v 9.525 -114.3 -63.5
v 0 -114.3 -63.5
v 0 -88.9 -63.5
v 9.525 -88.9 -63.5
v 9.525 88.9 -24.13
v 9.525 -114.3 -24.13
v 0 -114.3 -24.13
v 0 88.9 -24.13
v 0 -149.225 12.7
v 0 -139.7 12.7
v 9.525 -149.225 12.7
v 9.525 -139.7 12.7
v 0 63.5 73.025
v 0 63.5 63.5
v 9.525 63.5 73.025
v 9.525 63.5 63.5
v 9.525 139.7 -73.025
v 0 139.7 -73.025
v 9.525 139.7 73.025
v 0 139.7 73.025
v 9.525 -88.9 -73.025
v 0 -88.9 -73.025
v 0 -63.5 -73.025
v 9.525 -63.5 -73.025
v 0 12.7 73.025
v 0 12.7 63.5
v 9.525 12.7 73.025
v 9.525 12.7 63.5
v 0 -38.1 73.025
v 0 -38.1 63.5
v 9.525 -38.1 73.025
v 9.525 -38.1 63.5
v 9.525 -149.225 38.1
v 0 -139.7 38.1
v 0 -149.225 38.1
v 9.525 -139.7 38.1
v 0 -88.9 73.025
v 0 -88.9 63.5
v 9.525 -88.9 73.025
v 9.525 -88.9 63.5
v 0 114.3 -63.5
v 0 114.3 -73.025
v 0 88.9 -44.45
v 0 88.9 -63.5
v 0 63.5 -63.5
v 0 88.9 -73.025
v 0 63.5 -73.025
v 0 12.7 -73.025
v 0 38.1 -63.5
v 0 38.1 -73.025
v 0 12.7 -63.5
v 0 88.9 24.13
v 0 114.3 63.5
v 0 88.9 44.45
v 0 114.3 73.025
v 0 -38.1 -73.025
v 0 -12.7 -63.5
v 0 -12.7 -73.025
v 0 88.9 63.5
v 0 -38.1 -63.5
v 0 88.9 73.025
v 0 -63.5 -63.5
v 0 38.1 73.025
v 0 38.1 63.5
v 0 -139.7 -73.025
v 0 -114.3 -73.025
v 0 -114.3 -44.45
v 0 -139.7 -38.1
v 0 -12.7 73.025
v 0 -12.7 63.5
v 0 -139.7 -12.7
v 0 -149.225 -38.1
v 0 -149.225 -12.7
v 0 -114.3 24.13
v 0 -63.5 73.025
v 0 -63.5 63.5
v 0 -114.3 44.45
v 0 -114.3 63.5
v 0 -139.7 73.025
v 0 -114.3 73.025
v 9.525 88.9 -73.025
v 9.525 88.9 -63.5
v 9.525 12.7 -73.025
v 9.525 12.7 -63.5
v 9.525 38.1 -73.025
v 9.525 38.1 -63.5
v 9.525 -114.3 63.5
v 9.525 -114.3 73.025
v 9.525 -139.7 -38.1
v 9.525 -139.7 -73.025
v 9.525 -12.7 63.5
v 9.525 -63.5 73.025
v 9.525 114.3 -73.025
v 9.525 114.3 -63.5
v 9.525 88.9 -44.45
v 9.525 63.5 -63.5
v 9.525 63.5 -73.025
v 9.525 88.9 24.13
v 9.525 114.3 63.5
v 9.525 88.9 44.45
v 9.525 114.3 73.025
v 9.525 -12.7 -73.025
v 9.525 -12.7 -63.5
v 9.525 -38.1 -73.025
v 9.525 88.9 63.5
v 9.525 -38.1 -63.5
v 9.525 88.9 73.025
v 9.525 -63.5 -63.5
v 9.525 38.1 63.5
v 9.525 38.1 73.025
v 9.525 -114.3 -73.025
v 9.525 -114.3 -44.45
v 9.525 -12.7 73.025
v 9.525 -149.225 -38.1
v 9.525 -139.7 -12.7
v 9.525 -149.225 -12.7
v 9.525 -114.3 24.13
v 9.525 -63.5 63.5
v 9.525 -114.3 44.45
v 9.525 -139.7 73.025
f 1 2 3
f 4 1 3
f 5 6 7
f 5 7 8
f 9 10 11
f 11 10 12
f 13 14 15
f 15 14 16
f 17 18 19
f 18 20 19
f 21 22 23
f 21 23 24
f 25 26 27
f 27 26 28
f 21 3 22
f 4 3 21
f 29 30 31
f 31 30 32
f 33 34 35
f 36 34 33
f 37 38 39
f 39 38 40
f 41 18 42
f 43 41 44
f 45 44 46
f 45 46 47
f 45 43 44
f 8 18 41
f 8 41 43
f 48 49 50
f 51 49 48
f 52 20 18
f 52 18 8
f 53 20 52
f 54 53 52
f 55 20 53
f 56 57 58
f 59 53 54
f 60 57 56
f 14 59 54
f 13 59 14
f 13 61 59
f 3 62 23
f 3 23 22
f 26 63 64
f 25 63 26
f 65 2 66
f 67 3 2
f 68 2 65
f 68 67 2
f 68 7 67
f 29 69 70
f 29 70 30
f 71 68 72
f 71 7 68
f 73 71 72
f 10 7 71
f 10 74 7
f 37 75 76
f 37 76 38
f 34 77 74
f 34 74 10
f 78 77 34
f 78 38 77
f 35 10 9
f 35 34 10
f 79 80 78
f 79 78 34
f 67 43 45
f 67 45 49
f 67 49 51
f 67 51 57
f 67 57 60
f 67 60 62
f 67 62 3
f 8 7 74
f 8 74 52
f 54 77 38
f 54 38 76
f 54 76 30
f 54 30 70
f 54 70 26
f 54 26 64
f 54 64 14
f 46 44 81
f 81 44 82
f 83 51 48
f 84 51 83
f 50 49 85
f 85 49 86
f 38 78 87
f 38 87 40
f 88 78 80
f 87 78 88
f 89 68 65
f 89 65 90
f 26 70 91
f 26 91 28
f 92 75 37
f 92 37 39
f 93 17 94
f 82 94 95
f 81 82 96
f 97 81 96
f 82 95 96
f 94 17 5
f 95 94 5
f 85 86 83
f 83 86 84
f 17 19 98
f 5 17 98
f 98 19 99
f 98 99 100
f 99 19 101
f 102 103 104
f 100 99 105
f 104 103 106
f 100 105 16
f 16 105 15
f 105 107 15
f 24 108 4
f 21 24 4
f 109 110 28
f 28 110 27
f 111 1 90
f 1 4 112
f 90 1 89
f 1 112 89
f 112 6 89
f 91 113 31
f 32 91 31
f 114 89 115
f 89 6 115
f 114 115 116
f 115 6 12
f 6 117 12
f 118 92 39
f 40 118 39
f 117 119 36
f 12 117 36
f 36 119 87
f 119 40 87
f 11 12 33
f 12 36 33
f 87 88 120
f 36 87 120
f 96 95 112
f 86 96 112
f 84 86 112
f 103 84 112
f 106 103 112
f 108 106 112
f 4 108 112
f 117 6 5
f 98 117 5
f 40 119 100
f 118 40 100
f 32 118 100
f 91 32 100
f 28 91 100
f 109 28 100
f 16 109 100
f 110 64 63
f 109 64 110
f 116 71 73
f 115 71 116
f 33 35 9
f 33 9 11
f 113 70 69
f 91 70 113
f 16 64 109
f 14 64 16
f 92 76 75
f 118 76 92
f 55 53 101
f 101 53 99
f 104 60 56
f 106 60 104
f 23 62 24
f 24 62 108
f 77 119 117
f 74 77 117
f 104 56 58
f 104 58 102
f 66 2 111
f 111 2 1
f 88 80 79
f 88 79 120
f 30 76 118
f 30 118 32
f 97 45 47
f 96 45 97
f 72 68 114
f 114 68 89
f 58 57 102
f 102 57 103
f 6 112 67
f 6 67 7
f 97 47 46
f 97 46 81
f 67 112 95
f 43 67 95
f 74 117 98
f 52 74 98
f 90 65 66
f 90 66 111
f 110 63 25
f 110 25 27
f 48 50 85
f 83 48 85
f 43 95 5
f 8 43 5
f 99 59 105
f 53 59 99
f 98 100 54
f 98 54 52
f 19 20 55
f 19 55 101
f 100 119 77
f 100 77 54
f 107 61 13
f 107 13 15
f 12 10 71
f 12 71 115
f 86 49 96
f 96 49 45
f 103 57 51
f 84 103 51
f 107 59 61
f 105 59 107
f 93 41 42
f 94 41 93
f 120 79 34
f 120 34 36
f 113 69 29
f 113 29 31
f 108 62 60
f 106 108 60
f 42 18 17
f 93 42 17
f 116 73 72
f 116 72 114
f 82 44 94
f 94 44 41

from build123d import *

# Parameters (mm, degrees)
SKETCH1_W               = 127
SKETCH1_H               = 279.4
BOSS_EXTRUDE1_DEPTH     = 9.525
SKETCH2_W               = 9.525
SKETCH2_H               = 25.4
BOSS_EXTRUDE2_DEPTH     = 9.525
LPATTERN1_COUNT         = 6
LPATTERN1_PITCH         = 50.8
MIRROR1_COPY_1_SKETCH_W = 9.525
MIRROR1_COPY_1_SKETCH_H = 25.4
MIRROR1_COPY_1_DEPTH    = 9.525
MIRROR1_COPY_2_SKETCH_W = 9.525
MIRROR1_COPY_2_SKETCH_H = 25.4
MIRROR1_COPY_2_DEPTH    = 9.525
MIRROR1_COPY_3_SKETCH_W = 9.525
MIRROR1_COPY_3_SKETCH_H = 25.4
MIRROR1_COPY_3_DEPTH    = 9.525
MIRROR1_COPY_4_SKETCH_W = 9.525
MIRROR1_COPY_4_SKETCH_H = 25.4
MIRROR1_COPY_4_DEPTH    = 9.525
MIRROR1_COPY_5_SKETCH_W = 9.525
MIRROR1_COPY_5_SKETCH_H = 25.4
MIRROR1_COPY_5_DEPTH    = 9.525
SKETCH3_W               = 9.525
SKETCH3_H               = 25.4
BOSS_EXTRUDE3_DEPTH     = 9.525
LPATTERN2_COUNT         = 2
LPATTERN2_PITCH         = 50.8
SKETCH4_W               = 20.32
SKETCH4_H               = 203.2
CUT_EXTRUDE1_DEPTH      = 9.525


with BuildPart() as part:
    # Sketch1 → Boss-Extrude1 (new body)
    with BuildSketch(Plane(origin=(0, 0, 0), x_dir=(0, 0, -1), z_dir=(1, 0, 0))):
        Rectangle(SKETCH1_W, SKETCH1_H)
    extrude(amount=BOSS_EXTRUDE1_DEPTH)

    # Sketch2 → Boss-Extrude2 (add)
    with BuildSketch(Plane.XY.offset(63.5)):
        with Locations((4.7625, 127)):
            Rectangle(SKETCH2_W, SKETCH2_H)
    boss_extrude2 = extrude(amount=BOSS_EXTRUDE2_DEPTH)

    # LPattern1: Boss-Extrude2 ×6
    with Locations(*[(0, -i * LPATTERN1_PITCH, 0) for i in range(1, LPATTERN1_COUNT)]):
        add(boss_extrude2)

    # Mirror1: Boss-Extrude2 across plane
    add(boss_extrude2.mirror(Plane.XY))

    # Mirror1 copy 1 sketch → Mirror1 copy 1 (add)
    with BuildSketch(Plane(origin=(0, -50.8, -63.5), x_dir=(1, 0, 0), z_dir=(0, 0, -1))):
        with Locations((4.7625, -127)):
            Rectangle(MIRROR1_COPY_1_SKETCH_W, MIRROR1_COPY_1_SKETCH_H)
    extrude(amount=MIRROR1_COPY_1_DEPTH)

    # Mirror1 copy 2 sketch → Mirror1 copy 2 (add)
    with BuildSketch(Plane(origin=(0, -101.6, -63.5), x_dir=(1, 0, 0), z_dir=(0, 0, -1))):
        with Locations((4.7625, -127)):
            Rectangle(MIRROR1_COPY_2_SKETCH_W, MIRROR1_COPY_2_SKETCH_H)
    extrude(amount=MIRROR1_COPY_2_DEPTH)

    # Mirror1 copy 3 sketch → Mirror1 copy 3 (add)
    with BuildSketch(Plane(origin=(0, -152.4, -63.5), x_dir=(1, 0, 0), z_dir=(0, 0, -1))):
        with Locations((4.7625, -127)):
            Rectangle(MIRROR1_COPY_3_SKETCH_W, MIRROR1_COPY_3_SKETCH_H)
    extrude(amount=MIRROR1_COPY_3_DEPTH)

    # Mirror1 copy 4 sketch → Mirror1 copy 4 (add)
    with BuildSketch(Plane(origin=(0, -203.2, -63.5), x_dir=(1, 0, 0), z_dir=(0, 0, -1))):
        with Locations((4.7625, -127)):
            Rectangle(MIRROR1_COPY_4_SKETCH_W, MIRROR1_COPY_4_SKETCH_H)
    extrude(amount=MIRROR1_COPY_4_DEPTH)

    # Mirror1 copy 5 sketch → Mirror1 copy 5 (add)
    with BuildSketch(Plane(origin=(0, -254, -63.5), x_dir=(1, 0, 0), z_dir=(0, 0, -1))):
        with Locations((4.7625, -127)):
            Rectangle(MIRROR1_COPY_5_SKETCH_W, MIRROR1_COPY_5_SKETCH_H)
    extrude(amount=MIRROR1_COPY_5_DEPTH)

    # Sketch3 → Boss-Extrude3 (add)
    with BuildSketch(Plane.XZ.offset(139.7)):
        with Locations((4.7625, 25.4)):
            Rectangle(SKETCH3_W, SKETCH3_H)
    boss_extrude3 = extrude(amount=BOSS_EXTRUDE3_DEPTH)

    # LPattern2: Boss-Extrude3 ×2
    with Locations(*[(0, 0, -i * LPATTERN2_PITCH) for i in range(1, LPATTERN2_COUNT)]):
        add(boss_extrude3)

    # Sketch4 → Cut-Extrude1 (cut)
    with BuildSketch(Plane(origin=(9.525, 0, 0), x_dir=(0, 0, -1), z_dir=(1, 0, 0))):
        with Locations((-34.29, -12.7)):
            Rectangle(SKETCH4_W, SKETCH4_H)
    cut_extrude1 = extrude(amount=-CUT_EXTRUDE1_DEPTH, mode=Mode.SUBTRACT)

    # Mirror2: Cut-Extrude1 across plane
    add(cut_extrude1.mirror(Plane.XY), mode=Mode.SUBTRACT)


solid = part.part
